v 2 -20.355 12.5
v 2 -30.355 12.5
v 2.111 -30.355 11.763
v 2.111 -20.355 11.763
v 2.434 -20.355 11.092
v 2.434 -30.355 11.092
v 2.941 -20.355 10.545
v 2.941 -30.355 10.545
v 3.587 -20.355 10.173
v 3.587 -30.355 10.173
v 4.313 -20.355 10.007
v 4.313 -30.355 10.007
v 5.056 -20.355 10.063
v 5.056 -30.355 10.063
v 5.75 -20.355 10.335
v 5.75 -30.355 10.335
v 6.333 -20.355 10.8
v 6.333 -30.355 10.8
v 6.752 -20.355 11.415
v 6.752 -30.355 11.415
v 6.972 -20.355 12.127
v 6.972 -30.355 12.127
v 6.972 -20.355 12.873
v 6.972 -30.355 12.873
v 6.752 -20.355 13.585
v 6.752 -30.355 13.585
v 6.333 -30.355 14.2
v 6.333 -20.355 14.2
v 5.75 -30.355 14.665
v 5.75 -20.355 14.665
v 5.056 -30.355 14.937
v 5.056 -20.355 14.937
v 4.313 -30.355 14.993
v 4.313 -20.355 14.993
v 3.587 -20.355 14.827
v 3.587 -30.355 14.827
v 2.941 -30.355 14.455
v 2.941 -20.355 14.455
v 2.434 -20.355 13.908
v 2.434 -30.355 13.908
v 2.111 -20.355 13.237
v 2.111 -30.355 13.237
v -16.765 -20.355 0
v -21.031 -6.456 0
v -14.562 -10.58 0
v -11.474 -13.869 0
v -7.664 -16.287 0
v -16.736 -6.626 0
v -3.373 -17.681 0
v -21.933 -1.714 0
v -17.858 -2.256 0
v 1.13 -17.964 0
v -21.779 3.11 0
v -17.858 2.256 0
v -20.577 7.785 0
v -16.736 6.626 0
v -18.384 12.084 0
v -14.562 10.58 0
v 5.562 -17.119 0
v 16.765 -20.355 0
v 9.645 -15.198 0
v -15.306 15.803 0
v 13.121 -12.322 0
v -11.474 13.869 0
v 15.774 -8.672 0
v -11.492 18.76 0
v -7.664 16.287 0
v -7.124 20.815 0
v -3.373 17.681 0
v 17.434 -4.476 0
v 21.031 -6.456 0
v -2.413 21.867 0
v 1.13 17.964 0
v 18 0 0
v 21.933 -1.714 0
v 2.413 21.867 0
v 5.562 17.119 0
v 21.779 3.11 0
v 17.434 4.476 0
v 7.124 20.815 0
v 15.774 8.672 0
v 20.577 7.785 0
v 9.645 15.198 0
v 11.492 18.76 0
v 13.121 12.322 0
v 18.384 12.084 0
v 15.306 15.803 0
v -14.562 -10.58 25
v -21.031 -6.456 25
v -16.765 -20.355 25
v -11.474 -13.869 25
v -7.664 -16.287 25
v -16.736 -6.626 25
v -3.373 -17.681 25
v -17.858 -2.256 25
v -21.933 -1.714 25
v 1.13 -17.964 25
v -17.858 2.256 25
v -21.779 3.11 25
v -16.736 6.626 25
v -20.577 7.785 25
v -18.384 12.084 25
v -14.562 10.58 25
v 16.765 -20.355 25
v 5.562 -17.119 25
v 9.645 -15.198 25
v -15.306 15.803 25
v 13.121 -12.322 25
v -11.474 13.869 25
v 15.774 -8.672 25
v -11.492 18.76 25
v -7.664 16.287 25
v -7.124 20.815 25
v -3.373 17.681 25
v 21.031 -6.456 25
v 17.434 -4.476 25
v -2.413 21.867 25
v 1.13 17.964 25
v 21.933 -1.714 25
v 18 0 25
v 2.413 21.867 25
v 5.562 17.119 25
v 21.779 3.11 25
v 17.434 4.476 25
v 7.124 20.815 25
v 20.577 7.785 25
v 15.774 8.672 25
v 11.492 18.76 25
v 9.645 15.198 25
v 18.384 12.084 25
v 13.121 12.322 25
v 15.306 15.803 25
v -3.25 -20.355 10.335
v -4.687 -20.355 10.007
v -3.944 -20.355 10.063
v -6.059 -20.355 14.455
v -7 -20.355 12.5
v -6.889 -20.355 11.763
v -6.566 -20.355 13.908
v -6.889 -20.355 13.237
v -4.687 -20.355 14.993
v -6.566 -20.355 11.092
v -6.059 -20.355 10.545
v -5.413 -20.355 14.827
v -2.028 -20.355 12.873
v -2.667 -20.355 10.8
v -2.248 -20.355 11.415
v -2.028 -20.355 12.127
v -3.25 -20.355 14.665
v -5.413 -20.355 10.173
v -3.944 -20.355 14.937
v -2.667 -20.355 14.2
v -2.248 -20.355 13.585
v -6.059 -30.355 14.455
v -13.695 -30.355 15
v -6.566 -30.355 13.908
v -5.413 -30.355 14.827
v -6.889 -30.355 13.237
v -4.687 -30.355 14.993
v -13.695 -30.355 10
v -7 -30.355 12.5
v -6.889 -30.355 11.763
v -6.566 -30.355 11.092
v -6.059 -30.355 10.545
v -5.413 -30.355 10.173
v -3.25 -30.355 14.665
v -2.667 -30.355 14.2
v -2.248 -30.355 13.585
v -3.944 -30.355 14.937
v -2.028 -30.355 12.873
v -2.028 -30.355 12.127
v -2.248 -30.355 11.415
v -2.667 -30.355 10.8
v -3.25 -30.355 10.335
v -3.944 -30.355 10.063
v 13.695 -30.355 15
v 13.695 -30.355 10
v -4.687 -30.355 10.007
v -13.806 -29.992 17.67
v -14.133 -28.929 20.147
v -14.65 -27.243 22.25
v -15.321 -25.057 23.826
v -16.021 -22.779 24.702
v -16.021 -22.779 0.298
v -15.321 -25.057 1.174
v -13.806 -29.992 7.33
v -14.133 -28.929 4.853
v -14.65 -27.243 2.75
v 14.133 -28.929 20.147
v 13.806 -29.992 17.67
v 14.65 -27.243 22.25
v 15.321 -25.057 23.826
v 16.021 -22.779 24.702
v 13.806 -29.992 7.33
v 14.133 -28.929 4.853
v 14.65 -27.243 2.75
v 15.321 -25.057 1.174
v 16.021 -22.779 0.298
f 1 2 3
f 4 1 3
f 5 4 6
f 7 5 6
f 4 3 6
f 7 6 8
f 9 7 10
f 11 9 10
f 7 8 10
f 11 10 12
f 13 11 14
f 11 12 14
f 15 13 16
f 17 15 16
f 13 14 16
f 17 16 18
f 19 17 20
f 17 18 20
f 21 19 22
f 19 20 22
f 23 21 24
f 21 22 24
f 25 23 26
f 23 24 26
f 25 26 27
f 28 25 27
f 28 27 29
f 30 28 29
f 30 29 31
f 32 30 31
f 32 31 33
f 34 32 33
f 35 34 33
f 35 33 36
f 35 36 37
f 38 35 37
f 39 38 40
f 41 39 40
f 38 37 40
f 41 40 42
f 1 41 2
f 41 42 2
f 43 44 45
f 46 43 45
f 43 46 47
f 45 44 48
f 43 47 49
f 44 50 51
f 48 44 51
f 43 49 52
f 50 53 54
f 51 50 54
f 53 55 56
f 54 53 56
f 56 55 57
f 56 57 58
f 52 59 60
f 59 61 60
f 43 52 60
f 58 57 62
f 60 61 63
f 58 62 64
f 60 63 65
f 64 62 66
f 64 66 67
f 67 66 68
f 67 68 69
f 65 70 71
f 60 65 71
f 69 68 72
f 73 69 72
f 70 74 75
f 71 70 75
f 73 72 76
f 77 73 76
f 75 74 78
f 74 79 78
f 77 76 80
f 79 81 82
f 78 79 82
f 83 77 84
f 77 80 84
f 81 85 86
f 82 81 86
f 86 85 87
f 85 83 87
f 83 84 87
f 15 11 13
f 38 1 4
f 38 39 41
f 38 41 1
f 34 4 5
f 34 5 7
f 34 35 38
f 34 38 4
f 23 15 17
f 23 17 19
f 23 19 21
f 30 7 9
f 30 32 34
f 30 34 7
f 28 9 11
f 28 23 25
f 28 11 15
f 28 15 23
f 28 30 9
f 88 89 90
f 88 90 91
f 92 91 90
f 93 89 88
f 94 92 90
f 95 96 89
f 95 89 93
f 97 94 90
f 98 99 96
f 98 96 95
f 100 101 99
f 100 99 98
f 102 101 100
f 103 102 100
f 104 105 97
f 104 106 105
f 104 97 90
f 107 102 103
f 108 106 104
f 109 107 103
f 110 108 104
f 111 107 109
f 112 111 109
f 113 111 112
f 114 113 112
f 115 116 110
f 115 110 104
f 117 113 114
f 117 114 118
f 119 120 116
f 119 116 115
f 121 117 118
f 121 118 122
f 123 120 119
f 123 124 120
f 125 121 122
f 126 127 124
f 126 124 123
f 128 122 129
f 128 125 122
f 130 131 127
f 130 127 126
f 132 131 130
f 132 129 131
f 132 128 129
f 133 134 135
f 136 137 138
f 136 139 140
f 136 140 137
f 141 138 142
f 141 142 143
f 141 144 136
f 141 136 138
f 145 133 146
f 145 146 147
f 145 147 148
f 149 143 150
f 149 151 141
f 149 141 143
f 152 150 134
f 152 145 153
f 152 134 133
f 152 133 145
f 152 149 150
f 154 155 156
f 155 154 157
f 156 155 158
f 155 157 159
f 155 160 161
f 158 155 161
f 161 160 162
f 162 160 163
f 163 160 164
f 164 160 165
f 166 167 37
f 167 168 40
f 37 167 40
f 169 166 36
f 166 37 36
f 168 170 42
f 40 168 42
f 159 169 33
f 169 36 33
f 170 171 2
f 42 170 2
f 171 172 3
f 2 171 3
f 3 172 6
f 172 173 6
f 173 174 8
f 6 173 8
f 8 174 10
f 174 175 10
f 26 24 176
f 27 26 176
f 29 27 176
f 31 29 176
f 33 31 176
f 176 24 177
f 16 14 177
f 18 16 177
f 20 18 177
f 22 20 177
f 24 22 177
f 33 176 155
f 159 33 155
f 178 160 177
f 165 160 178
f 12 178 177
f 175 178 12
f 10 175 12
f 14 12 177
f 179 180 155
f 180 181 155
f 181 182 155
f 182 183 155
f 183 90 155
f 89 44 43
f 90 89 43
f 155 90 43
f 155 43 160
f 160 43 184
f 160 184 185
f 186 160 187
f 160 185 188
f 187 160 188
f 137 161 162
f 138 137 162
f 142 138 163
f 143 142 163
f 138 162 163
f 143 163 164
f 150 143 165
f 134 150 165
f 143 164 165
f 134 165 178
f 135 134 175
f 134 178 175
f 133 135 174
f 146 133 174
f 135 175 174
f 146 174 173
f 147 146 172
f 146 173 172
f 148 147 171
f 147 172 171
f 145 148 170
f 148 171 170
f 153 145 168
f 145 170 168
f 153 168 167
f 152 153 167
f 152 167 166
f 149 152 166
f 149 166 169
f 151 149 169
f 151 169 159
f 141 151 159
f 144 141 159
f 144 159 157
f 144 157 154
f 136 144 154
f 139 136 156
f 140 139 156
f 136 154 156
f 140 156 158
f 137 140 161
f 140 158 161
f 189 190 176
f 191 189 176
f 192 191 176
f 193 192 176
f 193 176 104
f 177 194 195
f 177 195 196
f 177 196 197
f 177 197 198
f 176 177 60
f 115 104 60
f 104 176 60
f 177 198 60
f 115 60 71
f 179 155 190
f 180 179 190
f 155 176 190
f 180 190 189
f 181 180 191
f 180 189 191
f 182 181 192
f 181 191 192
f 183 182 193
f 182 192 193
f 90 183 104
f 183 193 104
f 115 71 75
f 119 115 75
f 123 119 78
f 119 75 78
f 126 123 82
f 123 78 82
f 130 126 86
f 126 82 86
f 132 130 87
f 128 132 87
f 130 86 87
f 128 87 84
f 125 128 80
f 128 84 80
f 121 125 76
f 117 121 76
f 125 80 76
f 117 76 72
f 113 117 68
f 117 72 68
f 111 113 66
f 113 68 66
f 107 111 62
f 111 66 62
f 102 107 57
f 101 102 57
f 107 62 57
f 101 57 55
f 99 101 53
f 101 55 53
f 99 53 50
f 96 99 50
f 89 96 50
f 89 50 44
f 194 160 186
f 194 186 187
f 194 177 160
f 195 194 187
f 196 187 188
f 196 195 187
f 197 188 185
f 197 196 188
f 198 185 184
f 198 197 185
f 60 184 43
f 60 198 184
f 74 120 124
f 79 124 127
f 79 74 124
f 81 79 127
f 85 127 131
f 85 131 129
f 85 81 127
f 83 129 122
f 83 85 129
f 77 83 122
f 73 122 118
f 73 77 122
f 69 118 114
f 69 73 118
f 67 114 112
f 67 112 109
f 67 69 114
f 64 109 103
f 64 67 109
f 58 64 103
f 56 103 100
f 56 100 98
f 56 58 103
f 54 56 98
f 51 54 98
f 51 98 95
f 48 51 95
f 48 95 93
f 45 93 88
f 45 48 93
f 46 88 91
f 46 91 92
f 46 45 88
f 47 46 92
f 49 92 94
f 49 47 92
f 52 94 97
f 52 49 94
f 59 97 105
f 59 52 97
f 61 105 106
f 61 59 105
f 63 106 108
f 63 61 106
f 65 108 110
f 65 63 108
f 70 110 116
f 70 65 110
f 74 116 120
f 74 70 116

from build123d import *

# Parameters (mm, degrees)
SKETCH1_R           = 18
BOSS_EXTRUDE1_DEPTH = 25
CUT_EXTRUDE1_DEPTH  = 10
FILLET1_R           = 10


with BuildPart() as part:
    # Sketch1 → Boss-Extrude1 (new body)
    with BuildSketch(Plane.XY):
        with BuildLine():
            Line((-21.031401564, -6.456016438), (-13.695019248, -30.355336397))
            Line((-13.695019248, -30.355336397), (13.695019248, -30.355336397))
            Line((13.695019248, -30.355336397), (21.031401564, -6.456016438))
            ThreePointArc((21.031401564, -6.456016438), (0, 22), (-21.031401564, -6.456016438))
        make_face()
        Circle(SKETCH1_R, mode=Mode.SUBTRACT)
    extrude(amount=BOSS_EXTRUDE1_DEPTH)

    # Sketch2 → Cut-Extrude1 (cut)
    with BuildSketch(Plane.XZ.offset(30.355336397)):
        with BuildLine():
            Line((-7, 12.5), (-4.5, 12.5))
            Line((-4.5, 12.5), (-2, 12.5))
            ThreePointArc((-2, 12.5), (-4.5, 15), (-7, 12.5))
        make_face()
        with BuildLine():
            Line((-2, 12.5), (-4.5, 12.5))
            Line((-4.5, 12.5), (-7, 12.5))
            ThreePointArc((-7, 12.5), (-4.5, 10), (-2, 12.5))
        make_face()
        with BuildLine():
            ThreePointArc((7, 12.5), (4.5, 15), (2, 12.5))
            Line((2, 12.5), (4.5, 12.5))
            Line((4.5, 12.5), (7, 12.5))
        make_face()
        with BuildLine():
            Line((4.5, 12.5), (2, 12.5))
            ThreePointArc((2, 12.5), (4.5, 10), (7, 12.5))
            Line((7, 12.5), (4.5, 12.5))
        make_face()
    extrude(amount=-CUT_EXTRUDE1_DEPTH, mode=Mode.SUBTRACT)

    # Fillet1
    fillet1_edges = [part.edges().sort_by_distance(p)[0] for p in [
        (0, -30.355336397, 25),
        (0, -30.355336397, 0),
    ]]
    fillet(fillet1_edges, radius=FILLET1_R - 0.0001)  # a hair under: the kernel refuses the full size


solid = part.part
